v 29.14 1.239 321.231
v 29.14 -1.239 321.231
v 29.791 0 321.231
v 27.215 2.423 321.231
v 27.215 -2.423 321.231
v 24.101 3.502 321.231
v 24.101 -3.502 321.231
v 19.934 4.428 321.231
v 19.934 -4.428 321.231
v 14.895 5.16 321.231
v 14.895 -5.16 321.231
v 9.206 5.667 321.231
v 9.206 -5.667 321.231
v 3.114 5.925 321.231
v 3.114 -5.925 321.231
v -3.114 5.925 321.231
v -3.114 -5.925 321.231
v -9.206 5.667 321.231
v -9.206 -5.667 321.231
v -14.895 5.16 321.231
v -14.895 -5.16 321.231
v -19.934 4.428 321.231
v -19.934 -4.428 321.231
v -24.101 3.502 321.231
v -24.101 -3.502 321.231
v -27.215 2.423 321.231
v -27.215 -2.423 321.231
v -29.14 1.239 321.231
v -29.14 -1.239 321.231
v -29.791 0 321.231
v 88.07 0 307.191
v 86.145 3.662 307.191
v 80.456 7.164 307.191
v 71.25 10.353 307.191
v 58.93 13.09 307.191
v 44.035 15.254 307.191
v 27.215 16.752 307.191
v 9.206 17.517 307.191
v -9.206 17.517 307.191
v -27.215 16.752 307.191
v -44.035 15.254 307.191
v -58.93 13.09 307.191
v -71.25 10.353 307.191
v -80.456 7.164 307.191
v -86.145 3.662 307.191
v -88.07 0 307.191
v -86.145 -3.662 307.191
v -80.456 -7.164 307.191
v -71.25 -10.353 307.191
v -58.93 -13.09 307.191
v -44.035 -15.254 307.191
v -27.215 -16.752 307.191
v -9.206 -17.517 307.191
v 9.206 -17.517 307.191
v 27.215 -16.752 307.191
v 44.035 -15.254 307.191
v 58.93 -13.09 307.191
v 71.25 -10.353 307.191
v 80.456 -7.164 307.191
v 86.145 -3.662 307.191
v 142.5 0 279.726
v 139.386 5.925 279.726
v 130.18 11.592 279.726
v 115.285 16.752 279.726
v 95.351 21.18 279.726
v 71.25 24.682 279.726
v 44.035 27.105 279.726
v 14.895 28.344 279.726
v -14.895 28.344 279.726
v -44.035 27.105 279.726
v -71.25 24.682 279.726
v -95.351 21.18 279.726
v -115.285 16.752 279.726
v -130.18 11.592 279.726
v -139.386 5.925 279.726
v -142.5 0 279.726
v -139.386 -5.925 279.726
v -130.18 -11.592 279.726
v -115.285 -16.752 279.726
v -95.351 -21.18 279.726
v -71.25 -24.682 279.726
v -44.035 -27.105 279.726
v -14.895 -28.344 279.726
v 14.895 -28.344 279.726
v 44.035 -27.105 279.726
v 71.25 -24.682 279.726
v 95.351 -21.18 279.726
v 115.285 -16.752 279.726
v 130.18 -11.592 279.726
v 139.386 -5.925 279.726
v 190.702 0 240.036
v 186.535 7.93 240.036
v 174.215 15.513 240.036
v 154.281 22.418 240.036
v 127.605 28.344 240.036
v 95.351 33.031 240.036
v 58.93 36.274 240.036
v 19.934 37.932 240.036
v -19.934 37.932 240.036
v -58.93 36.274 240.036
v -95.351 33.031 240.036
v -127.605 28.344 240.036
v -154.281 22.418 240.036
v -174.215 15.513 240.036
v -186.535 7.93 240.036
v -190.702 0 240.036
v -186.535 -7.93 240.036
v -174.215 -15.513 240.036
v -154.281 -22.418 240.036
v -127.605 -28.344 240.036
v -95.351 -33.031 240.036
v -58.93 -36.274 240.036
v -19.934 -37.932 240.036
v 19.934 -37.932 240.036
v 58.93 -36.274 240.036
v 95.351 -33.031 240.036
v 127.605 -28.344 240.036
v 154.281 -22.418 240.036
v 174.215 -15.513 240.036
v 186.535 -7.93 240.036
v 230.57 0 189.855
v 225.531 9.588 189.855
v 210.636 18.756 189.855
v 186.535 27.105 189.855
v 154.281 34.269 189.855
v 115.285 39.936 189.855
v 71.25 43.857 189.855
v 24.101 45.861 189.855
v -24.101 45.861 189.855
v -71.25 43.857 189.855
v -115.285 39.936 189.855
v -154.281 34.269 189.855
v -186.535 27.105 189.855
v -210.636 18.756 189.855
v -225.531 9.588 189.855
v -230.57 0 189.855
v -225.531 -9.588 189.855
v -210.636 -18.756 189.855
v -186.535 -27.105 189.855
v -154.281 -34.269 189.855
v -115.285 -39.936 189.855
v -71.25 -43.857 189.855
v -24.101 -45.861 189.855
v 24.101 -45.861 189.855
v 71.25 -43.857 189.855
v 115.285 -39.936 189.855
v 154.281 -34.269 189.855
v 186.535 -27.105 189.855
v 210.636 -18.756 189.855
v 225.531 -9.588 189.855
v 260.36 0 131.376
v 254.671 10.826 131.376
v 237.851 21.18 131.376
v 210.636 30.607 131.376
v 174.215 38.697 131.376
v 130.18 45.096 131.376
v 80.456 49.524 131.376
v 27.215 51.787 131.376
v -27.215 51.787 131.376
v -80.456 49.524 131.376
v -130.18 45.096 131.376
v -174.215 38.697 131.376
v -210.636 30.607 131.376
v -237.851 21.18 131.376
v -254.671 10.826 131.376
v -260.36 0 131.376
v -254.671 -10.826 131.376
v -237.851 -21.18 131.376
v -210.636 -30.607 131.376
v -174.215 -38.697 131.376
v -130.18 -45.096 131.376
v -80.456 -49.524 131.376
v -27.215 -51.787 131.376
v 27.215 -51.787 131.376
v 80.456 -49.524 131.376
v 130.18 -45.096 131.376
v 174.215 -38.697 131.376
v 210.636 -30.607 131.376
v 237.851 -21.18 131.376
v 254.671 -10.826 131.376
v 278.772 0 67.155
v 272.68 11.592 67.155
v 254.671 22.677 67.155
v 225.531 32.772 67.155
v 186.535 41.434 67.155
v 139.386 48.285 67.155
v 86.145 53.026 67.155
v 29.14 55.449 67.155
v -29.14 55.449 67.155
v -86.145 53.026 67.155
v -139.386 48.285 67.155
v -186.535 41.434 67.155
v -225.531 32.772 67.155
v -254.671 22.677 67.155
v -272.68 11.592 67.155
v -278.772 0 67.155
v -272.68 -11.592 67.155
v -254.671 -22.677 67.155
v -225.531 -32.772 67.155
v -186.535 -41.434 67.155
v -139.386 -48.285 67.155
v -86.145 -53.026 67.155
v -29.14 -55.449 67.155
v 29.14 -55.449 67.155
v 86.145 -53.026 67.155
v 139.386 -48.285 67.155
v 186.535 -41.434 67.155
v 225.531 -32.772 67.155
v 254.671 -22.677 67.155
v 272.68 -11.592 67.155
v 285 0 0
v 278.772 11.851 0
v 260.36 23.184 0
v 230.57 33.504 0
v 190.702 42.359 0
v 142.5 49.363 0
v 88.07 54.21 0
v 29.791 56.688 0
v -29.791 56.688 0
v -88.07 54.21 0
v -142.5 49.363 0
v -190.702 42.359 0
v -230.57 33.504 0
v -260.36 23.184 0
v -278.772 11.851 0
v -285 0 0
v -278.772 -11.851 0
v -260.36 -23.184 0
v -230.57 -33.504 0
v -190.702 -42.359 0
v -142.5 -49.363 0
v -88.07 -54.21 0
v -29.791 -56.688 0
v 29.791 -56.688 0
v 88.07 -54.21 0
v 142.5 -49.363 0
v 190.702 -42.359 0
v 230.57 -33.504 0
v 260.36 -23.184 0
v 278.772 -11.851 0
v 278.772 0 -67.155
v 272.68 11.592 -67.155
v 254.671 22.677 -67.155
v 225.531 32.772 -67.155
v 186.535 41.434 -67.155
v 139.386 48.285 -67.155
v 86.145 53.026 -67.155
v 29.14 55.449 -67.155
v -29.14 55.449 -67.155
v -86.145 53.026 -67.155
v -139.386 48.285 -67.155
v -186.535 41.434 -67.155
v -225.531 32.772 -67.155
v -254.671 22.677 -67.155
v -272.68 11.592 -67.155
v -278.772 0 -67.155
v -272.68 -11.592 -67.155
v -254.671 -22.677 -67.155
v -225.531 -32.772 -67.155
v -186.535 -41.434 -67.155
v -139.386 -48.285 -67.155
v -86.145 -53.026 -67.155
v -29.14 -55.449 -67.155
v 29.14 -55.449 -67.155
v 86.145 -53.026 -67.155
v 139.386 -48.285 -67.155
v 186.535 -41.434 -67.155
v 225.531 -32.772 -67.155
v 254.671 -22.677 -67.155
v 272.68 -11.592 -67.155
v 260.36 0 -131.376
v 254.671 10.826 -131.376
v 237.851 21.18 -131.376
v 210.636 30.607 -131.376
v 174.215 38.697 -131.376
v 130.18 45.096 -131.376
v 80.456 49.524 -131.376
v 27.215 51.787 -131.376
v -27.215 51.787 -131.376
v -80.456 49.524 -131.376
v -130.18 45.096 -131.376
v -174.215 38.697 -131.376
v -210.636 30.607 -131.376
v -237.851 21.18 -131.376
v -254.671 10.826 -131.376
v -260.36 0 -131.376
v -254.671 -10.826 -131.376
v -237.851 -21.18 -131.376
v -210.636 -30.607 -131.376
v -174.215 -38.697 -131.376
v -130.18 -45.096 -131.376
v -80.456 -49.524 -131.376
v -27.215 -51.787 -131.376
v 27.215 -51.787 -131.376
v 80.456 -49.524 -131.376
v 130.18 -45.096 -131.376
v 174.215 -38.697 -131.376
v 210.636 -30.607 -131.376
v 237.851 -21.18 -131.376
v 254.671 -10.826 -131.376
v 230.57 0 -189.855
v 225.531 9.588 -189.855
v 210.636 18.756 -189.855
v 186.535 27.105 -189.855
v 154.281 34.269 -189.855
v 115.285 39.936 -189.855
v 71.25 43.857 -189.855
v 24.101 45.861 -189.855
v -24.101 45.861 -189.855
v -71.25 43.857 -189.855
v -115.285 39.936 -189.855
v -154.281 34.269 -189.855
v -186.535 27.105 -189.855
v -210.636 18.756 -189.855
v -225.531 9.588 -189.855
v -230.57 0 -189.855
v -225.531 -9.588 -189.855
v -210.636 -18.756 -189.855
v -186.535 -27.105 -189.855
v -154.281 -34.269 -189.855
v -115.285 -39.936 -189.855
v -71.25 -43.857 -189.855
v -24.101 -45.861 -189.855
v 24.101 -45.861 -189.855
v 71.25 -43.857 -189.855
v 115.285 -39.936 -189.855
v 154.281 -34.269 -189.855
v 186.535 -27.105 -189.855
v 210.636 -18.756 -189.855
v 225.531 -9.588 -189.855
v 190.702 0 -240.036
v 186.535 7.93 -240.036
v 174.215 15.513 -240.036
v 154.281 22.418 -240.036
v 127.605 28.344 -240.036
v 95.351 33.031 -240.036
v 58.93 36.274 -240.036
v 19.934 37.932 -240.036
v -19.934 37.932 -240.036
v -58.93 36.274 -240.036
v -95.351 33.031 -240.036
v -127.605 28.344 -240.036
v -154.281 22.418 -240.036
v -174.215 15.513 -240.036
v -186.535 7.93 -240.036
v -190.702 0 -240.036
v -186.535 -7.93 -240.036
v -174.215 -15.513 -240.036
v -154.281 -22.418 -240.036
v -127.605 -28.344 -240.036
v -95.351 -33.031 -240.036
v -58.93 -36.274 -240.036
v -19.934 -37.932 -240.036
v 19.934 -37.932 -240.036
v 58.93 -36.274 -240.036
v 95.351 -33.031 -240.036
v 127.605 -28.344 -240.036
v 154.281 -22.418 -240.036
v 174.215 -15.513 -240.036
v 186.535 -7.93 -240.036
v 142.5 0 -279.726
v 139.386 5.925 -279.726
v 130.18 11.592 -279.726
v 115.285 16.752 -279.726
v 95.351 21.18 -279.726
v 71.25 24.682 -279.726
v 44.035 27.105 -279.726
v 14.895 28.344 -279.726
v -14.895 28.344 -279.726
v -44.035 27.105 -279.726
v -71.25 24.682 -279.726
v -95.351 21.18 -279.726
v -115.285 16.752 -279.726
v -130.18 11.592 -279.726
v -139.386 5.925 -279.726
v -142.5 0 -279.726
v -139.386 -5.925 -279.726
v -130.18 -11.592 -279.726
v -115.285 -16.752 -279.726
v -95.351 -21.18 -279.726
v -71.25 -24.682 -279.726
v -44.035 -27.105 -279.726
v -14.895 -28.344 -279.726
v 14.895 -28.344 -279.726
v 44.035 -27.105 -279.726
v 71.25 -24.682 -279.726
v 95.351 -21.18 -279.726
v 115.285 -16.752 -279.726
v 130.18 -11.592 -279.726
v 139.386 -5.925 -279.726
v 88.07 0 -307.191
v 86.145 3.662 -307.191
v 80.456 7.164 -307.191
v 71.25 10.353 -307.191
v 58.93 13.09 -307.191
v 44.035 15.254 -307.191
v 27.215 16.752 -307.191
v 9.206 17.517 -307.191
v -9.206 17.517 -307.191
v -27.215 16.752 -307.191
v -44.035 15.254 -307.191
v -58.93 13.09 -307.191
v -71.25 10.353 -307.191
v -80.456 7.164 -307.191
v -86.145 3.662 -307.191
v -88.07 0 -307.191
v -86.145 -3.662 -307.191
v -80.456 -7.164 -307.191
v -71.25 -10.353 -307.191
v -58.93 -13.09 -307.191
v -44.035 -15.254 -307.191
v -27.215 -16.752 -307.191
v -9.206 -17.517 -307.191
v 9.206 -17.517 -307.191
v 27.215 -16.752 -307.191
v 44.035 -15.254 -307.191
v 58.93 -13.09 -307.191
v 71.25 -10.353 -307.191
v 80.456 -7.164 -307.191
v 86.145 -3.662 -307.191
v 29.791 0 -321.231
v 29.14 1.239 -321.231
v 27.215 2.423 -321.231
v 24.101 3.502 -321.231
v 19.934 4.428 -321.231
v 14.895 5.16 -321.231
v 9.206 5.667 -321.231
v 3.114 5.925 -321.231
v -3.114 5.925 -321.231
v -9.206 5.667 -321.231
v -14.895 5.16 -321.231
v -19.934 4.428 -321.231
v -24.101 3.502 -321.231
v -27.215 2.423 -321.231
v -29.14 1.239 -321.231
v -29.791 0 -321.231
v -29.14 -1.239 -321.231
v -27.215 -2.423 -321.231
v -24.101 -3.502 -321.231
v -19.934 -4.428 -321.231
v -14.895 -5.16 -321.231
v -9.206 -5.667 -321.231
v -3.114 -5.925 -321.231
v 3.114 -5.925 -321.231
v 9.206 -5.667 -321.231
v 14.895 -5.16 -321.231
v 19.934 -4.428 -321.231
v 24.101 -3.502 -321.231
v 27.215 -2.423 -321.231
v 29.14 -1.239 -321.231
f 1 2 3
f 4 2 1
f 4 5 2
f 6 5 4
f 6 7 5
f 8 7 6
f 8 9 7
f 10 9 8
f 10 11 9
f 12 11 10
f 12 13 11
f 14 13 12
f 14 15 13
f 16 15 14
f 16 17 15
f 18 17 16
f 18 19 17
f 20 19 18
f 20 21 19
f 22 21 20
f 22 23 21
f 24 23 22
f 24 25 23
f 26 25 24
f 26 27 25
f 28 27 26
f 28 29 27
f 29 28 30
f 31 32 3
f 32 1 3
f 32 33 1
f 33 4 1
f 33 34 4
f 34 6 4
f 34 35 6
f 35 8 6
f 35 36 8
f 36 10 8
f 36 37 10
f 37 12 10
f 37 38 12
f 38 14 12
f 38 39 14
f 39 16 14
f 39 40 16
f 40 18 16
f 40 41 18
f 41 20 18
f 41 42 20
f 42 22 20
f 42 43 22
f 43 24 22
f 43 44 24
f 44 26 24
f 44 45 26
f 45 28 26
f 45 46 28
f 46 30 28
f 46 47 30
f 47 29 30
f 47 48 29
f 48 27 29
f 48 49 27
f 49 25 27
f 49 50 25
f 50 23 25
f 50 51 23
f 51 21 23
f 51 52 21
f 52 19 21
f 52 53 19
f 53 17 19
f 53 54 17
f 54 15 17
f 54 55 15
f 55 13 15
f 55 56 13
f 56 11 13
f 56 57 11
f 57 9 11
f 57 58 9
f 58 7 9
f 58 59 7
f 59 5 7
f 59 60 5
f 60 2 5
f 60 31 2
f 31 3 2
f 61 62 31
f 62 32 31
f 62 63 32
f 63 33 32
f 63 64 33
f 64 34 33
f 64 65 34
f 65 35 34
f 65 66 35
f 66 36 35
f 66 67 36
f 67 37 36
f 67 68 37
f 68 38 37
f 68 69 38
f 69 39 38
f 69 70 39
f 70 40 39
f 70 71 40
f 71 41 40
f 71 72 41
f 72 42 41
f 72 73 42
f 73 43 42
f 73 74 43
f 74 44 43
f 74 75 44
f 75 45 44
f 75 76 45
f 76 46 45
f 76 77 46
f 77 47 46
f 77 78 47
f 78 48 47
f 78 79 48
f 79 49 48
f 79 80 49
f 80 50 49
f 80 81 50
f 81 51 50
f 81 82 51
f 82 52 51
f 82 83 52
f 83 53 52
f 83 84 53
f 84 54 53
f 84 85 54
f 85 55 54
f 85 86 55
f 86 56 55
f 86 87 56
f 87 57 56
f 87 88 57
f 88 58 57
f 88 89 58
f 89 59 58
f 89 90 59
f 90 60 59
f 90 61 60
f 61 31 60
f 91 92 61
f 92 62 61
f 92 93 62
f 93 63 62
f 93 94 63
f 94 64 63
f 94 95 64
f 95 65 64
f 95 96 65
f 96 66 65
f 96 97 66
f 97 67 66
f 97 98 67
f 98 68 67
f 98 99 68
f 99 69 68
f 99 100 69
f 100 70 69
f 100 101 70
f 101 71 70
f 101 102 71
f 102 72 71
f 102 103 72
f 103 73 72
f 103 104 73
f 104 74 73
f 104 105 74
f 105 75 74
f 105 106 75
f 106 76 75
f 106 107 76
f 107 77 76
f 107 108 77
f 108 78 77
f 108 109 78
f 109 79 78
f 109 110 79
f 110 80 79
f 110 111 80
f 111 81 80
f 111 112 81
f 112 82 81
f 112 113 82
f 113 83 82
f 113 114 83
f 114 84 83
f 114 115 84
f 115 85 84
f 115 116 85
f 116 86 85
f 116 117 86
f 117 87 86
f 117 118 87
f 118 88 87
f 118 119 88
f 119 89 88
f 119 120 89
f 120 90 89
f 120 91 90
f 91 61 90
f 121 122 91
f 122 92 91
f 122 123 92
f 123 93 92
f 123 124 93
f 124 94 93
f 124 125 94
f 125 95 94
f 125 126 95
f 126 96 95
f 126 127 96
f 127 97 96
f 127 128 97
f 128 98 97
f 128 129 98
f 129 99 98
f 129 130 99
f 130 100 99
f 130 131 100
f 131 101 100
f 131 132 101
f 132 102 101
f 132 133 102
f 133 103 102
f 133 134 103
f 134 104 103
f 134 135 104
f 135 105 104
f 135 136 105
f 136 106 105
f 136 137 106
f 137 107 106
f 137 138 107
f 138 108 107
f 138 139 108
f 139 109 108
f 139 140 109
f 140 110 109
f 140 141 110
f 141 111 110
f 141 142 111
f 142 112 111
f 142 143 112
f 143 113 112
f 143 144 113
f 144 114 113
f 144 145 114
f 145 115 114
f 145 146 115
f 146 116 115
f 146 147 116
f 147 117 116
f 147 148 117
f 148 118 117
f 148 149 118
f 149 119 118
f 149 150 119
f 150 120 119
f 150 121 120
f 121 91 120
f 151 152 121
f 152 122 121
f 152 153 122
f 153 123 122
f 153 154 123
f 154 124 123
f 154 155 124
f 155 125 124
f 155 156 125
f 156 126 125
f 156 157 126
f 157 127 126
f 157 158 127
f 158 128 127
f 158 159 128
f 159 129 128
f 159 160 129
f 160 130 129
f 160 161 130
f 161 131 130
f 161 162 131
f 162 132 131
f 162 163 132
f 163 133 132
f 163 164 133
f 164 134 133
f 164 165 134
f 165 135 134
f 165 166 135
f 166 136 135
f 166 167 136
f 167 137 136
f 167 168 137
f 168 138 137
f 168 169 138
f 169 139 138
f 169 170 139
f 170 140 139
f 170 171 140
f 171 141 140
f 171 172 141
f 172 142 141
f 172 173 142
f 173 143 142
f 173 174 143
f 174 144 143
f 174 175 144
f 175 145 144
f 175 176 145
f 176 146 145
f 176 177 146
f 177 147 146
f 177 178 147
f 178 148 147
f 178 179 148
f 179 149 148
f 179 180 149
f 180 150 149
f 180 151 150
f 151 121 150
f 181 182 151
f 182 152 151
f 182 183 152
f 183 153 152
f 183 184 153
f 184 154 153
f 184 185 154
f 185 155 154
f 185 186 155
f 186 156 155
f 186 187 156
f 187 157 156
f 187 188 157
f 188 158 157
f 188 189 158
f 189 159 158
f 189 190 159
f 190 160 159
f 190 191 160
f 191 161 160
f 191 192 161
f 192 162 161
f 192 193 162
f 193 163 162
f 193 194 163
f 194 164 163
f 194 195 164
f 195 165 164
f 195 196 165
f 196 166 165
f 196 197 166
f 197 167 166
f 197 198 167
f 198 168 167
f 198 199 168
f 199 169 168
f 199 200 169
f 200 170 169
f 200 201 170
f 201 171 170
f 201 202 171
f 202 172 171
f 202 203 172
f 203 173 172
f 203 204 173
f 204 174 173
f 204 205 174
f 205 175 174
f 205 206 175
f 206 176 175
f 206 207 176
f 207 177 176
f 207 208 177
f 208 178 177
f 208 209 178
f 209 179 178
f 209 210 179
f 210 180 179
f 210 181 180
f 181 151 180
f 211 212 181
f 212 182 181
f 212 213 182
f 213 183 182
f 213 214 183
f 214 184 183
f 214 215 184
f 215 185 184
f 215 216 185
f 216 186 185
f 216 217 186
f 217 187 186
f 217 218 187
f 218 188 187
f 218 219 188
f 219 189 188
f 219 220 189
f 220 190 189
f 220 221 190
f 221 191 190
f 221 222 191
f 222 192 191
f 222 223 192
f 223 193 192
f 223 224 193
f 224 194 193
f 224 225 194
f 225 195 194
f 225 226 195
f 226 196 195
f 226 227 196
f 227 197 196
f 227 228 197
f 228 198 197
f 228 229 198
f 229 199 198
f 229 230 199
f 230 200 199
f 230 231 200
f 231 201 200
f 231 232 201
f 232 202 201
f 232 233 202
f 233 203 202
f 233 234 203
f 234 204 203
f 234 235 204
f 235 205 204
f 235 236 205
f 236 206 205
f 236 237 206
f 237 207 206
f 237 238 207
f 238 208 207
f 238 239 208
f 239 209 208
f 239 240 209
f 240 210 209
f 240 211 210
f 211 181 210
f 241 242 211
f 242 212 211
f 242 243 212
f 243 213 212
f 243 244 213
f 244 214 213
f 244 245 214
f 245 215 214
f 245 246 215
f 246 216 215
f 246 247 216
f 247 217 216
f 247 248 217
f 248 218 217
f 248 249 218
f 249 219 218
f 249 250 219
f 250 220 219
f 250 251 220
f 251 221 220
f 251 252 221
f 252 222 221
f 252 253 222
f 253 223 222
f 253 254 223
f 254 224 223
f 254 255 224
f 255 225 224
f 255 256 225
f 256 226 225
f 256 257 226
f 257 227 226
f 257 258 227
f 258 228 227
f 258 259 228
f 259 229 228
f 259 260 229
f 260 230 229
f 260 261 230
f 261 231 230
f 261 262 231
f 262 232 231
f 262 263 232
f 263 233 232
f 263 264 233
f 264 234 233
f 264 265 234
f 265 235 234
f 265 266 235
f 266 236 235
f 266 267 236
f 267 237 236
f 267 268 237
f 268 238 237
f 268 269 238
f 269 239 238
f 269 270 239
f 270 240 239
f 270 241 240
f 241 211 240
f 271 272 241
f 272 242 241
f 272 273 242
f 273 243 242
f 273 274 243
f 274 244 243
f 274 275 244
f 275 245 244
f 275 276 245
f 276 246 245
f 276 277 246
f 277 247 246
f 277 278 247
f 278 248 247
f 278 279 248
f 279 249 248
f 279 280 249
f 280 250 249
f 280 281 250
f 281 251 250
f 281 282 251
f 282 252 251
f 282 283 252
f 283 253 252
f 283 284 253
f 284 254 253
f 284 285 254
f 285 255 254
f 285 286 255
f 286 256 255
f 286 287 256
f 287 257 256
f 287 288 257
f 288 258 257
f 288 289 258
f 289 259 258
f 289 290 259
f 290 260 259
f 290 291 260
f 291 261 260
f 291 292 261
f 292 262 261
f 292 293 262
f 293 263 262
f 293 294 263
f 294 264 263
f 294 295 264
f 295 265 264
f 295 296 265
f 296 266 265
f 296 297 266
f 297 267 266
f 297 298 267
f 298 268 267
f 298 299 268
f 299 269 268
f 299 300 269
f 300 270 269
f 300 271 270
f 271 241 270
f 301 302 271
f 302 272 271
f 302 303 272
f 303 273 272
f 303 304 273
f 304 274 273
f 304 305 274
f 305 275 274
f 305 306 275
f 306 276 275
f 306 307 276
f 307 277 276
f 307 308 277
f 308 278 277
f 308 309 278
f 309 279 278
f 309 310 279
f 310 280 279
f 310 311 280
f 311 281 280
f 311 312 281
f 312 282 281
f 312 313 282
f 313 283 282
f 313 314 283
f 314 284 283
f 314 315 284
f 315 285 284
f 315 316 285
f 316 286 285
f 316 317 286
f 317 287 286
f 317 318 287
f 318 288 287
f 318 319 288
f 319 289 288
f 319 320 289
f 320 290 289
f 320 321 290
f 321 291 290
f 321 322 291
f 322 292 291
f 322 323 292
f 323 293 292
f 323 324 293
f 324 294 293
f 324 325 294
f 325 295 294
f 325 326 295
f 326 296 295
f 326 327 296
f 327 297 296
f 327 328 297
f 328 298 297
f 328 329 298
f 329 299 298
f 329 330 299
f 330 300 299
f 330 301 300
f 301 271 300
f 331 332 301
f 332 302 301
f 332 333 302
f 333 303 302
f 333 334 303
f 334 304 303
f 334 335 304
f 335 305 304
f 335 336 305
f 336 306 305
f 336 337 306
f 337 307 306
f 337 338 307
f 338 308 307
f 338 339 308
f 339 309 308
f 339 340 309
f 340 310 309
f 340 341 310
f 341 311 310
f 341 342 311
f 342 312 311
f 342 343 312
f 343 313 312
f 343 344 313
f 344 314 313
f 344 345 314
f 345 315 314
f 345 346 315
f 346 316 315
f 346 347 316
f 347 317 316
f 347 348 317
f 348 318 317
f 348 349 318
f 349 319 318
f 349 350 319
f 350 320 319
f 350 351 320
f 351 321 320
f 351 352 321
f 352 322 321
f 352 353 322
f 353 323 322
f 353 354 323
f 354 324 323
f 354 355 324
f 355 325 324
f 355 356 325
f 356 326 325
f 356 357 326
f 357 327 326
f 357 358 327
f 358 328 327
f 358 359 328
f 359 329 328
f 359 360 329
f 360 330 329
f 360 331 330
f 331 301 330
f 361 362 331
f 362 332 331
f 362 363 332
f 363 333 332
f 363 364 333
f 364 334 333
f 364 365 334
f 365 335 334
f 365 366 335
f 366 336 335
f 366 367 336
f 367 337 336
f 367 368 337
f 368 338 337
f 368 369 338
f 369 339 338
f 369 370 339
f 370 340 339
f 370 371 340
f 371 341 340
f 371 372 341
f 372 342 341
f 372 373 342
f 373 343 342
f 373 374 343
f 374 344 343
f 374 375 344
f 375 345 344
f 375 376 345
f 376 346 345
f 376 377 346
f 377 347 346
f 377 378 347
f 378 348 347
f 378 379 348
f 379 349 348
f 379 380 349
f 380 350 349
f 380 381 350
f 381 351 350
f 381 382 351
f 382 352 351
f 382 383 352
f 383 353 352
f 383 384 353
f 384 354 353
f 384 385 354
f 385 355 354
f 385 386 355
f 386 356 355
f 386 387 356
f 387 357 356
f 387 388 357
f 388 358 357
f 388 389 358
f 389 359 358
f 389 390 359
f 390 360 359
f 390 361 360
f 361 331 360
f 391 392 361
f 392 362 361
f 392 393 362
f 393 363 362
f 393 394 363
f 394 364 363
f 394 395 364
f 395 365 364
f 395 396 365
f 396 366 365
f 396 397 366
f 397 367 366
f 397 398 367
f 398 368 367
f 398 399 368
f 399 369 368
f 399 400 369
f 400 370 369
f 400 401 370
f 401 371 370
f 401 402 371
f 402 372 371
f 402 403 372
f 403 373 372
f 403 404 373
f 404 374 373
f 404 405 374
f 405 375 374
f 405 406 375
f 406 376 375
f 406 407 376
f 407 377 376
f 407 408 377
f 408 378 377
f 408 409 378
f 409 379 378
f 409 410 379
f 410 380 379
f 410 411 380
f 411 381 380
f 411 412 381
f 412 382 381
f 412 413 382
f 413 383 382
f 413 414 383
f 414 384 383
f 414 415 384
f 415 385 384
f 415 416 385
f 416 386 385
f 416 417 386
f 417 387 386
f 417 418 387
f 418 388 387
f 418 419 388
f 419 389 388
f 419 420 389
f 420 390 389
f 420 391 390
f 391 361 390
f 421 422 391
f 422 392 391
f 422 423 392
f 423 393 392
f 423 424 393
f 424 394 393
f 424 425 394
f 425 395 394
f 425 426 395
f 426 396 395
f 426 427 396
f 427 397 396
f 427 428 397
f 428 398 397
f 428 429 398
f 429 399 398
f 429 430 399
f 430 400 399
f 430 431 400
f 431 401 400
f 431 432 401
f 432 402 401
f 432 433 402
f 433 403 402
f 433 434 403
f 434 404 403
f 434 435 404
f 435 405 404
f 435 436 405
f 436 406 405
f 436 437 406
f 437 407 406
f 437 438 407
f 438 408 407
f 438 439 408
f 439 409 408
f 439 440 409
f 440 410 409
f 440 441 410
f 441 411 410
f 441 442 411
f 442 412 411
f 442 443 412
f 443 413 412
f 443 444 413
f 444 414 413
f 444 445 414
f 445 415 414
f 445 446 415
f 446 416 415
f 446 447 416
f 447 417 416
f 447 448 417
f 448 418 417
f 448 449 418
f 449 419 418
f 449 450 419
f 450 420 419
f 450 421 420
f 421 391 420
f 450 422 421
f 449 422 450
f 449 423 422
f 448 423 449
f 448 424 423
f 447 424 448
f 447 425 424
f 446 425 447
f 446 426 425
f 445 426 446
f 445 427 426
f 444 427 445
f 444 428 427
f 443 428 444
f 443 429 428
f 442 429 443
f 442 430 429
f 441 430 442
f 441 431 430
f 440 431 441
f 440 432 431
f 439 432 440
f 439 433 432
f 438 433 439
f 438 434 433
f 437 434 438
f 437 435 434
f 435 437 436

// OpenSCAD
// Generated by SolidPython 1.0.1 on 2020-07-29 00:46:51


scale(v = [15, 3, 17]) {
	sphere(r = 19);
}
/***********************************************
*********      SolidPython code:      **********
************************************************
 
# import packages: SolidPython
from solid import *
from solid.utils import *
from itertools import chain, combinations, permutations


class Resize:

    def __init__(self, scad_file):
        self.scad_file = scad_file
        #self.scad_file = import_scad(scad_file)
        # cone/cylinder param:
        self.r1 = 0
        self.r2 = 0
        self.h = 0
        # rectangular prism param:
        self.w = 0
        self.l = 0
        # ellipse param:
        self.r = 0

    # import OpenScad code (file name corresponds to shape)


    # classify shape + parameters
    def assign(self, param1, param2, param3):
        if self.scad_file == 'cone.scad':
            self.r1 = param1
            self.r2 = param2
            self.h = param3
        elif self.scad_file == 'cylinder.scad':
            self.r1 = param1
            self.r2 = param2
            self.h = param3
        elif self.scad_file == 'rectangularPrism.scad':
            self.h = param1
            self.l = param2
            self.w = param3
        else:
            self.r = param1
            self.h = param2

    # resize parameters
    def iterate(self):
        x = range(3, 20, 2)
        i = 1
        if self.scad_file == 'cone.scad':
            tempList = list(permutations(x, 2))
            for temp in tempList:
                param1 = temp[0]
                param2 = temp[1]
                filepath = 'produced_scad_files/' + 'cone' + str(param1) + '_' + str(param2) + '_' + '.scad'
                scad_render_to_file(cylinder(h=param1, r1=param2, r2=0), filepath)

        elif self.scad_file == 'cylinder.scad':
            tempList = list(permutations(x, 3))
            for temp in tempList:
                param1 = temp[0]
                param2 = temp[1]
                filepath = 'produced_scad_files/' + 'cylinder' + str(param1) + '_' + str(param2) + '_' + '.scad'
                scad_render_to_file(cylinder(h=param1, r1=param2, r2=param2), filepath)

        elif self.scad_file == 'rectangularPrism.scad':
            tempList = list(permutations(x, 3))
            for temp in tempList:
                param1 = temp[0]
                param2 = temp[1]
                param3 = temp[2]
                filepath = 'produced_scad_files/' + 'rectangularPrism' + str(param1) + '_' + str(param2) + '_' + str(
                    param3) + '.scad'
                scad_render_to_file(cube(size=(param1, param2, param3)), filepath)

        elif self.scad_file == 'ellipse.scad':
            tempList = list(permutations(x, 4))
            for temp in tempList:
                param1 = temp[0]
                param2 = temp[1]
                param3 = temp[2]
                param4 = temp[3]
                filepath = 'produced_scad_files/' + 'ellipse' + str(param1) + '_' + str(param2) + '_' + str(param3) + '_' + str(param4) + '.scad'
                scad_render_to_file(scale([param1, param2, param3])(sphere(r=param4)), filepath)

    def render_to_scadfile(self):
        scad_render_to_file(scad, 'example.scad') 
 
************************************************/
